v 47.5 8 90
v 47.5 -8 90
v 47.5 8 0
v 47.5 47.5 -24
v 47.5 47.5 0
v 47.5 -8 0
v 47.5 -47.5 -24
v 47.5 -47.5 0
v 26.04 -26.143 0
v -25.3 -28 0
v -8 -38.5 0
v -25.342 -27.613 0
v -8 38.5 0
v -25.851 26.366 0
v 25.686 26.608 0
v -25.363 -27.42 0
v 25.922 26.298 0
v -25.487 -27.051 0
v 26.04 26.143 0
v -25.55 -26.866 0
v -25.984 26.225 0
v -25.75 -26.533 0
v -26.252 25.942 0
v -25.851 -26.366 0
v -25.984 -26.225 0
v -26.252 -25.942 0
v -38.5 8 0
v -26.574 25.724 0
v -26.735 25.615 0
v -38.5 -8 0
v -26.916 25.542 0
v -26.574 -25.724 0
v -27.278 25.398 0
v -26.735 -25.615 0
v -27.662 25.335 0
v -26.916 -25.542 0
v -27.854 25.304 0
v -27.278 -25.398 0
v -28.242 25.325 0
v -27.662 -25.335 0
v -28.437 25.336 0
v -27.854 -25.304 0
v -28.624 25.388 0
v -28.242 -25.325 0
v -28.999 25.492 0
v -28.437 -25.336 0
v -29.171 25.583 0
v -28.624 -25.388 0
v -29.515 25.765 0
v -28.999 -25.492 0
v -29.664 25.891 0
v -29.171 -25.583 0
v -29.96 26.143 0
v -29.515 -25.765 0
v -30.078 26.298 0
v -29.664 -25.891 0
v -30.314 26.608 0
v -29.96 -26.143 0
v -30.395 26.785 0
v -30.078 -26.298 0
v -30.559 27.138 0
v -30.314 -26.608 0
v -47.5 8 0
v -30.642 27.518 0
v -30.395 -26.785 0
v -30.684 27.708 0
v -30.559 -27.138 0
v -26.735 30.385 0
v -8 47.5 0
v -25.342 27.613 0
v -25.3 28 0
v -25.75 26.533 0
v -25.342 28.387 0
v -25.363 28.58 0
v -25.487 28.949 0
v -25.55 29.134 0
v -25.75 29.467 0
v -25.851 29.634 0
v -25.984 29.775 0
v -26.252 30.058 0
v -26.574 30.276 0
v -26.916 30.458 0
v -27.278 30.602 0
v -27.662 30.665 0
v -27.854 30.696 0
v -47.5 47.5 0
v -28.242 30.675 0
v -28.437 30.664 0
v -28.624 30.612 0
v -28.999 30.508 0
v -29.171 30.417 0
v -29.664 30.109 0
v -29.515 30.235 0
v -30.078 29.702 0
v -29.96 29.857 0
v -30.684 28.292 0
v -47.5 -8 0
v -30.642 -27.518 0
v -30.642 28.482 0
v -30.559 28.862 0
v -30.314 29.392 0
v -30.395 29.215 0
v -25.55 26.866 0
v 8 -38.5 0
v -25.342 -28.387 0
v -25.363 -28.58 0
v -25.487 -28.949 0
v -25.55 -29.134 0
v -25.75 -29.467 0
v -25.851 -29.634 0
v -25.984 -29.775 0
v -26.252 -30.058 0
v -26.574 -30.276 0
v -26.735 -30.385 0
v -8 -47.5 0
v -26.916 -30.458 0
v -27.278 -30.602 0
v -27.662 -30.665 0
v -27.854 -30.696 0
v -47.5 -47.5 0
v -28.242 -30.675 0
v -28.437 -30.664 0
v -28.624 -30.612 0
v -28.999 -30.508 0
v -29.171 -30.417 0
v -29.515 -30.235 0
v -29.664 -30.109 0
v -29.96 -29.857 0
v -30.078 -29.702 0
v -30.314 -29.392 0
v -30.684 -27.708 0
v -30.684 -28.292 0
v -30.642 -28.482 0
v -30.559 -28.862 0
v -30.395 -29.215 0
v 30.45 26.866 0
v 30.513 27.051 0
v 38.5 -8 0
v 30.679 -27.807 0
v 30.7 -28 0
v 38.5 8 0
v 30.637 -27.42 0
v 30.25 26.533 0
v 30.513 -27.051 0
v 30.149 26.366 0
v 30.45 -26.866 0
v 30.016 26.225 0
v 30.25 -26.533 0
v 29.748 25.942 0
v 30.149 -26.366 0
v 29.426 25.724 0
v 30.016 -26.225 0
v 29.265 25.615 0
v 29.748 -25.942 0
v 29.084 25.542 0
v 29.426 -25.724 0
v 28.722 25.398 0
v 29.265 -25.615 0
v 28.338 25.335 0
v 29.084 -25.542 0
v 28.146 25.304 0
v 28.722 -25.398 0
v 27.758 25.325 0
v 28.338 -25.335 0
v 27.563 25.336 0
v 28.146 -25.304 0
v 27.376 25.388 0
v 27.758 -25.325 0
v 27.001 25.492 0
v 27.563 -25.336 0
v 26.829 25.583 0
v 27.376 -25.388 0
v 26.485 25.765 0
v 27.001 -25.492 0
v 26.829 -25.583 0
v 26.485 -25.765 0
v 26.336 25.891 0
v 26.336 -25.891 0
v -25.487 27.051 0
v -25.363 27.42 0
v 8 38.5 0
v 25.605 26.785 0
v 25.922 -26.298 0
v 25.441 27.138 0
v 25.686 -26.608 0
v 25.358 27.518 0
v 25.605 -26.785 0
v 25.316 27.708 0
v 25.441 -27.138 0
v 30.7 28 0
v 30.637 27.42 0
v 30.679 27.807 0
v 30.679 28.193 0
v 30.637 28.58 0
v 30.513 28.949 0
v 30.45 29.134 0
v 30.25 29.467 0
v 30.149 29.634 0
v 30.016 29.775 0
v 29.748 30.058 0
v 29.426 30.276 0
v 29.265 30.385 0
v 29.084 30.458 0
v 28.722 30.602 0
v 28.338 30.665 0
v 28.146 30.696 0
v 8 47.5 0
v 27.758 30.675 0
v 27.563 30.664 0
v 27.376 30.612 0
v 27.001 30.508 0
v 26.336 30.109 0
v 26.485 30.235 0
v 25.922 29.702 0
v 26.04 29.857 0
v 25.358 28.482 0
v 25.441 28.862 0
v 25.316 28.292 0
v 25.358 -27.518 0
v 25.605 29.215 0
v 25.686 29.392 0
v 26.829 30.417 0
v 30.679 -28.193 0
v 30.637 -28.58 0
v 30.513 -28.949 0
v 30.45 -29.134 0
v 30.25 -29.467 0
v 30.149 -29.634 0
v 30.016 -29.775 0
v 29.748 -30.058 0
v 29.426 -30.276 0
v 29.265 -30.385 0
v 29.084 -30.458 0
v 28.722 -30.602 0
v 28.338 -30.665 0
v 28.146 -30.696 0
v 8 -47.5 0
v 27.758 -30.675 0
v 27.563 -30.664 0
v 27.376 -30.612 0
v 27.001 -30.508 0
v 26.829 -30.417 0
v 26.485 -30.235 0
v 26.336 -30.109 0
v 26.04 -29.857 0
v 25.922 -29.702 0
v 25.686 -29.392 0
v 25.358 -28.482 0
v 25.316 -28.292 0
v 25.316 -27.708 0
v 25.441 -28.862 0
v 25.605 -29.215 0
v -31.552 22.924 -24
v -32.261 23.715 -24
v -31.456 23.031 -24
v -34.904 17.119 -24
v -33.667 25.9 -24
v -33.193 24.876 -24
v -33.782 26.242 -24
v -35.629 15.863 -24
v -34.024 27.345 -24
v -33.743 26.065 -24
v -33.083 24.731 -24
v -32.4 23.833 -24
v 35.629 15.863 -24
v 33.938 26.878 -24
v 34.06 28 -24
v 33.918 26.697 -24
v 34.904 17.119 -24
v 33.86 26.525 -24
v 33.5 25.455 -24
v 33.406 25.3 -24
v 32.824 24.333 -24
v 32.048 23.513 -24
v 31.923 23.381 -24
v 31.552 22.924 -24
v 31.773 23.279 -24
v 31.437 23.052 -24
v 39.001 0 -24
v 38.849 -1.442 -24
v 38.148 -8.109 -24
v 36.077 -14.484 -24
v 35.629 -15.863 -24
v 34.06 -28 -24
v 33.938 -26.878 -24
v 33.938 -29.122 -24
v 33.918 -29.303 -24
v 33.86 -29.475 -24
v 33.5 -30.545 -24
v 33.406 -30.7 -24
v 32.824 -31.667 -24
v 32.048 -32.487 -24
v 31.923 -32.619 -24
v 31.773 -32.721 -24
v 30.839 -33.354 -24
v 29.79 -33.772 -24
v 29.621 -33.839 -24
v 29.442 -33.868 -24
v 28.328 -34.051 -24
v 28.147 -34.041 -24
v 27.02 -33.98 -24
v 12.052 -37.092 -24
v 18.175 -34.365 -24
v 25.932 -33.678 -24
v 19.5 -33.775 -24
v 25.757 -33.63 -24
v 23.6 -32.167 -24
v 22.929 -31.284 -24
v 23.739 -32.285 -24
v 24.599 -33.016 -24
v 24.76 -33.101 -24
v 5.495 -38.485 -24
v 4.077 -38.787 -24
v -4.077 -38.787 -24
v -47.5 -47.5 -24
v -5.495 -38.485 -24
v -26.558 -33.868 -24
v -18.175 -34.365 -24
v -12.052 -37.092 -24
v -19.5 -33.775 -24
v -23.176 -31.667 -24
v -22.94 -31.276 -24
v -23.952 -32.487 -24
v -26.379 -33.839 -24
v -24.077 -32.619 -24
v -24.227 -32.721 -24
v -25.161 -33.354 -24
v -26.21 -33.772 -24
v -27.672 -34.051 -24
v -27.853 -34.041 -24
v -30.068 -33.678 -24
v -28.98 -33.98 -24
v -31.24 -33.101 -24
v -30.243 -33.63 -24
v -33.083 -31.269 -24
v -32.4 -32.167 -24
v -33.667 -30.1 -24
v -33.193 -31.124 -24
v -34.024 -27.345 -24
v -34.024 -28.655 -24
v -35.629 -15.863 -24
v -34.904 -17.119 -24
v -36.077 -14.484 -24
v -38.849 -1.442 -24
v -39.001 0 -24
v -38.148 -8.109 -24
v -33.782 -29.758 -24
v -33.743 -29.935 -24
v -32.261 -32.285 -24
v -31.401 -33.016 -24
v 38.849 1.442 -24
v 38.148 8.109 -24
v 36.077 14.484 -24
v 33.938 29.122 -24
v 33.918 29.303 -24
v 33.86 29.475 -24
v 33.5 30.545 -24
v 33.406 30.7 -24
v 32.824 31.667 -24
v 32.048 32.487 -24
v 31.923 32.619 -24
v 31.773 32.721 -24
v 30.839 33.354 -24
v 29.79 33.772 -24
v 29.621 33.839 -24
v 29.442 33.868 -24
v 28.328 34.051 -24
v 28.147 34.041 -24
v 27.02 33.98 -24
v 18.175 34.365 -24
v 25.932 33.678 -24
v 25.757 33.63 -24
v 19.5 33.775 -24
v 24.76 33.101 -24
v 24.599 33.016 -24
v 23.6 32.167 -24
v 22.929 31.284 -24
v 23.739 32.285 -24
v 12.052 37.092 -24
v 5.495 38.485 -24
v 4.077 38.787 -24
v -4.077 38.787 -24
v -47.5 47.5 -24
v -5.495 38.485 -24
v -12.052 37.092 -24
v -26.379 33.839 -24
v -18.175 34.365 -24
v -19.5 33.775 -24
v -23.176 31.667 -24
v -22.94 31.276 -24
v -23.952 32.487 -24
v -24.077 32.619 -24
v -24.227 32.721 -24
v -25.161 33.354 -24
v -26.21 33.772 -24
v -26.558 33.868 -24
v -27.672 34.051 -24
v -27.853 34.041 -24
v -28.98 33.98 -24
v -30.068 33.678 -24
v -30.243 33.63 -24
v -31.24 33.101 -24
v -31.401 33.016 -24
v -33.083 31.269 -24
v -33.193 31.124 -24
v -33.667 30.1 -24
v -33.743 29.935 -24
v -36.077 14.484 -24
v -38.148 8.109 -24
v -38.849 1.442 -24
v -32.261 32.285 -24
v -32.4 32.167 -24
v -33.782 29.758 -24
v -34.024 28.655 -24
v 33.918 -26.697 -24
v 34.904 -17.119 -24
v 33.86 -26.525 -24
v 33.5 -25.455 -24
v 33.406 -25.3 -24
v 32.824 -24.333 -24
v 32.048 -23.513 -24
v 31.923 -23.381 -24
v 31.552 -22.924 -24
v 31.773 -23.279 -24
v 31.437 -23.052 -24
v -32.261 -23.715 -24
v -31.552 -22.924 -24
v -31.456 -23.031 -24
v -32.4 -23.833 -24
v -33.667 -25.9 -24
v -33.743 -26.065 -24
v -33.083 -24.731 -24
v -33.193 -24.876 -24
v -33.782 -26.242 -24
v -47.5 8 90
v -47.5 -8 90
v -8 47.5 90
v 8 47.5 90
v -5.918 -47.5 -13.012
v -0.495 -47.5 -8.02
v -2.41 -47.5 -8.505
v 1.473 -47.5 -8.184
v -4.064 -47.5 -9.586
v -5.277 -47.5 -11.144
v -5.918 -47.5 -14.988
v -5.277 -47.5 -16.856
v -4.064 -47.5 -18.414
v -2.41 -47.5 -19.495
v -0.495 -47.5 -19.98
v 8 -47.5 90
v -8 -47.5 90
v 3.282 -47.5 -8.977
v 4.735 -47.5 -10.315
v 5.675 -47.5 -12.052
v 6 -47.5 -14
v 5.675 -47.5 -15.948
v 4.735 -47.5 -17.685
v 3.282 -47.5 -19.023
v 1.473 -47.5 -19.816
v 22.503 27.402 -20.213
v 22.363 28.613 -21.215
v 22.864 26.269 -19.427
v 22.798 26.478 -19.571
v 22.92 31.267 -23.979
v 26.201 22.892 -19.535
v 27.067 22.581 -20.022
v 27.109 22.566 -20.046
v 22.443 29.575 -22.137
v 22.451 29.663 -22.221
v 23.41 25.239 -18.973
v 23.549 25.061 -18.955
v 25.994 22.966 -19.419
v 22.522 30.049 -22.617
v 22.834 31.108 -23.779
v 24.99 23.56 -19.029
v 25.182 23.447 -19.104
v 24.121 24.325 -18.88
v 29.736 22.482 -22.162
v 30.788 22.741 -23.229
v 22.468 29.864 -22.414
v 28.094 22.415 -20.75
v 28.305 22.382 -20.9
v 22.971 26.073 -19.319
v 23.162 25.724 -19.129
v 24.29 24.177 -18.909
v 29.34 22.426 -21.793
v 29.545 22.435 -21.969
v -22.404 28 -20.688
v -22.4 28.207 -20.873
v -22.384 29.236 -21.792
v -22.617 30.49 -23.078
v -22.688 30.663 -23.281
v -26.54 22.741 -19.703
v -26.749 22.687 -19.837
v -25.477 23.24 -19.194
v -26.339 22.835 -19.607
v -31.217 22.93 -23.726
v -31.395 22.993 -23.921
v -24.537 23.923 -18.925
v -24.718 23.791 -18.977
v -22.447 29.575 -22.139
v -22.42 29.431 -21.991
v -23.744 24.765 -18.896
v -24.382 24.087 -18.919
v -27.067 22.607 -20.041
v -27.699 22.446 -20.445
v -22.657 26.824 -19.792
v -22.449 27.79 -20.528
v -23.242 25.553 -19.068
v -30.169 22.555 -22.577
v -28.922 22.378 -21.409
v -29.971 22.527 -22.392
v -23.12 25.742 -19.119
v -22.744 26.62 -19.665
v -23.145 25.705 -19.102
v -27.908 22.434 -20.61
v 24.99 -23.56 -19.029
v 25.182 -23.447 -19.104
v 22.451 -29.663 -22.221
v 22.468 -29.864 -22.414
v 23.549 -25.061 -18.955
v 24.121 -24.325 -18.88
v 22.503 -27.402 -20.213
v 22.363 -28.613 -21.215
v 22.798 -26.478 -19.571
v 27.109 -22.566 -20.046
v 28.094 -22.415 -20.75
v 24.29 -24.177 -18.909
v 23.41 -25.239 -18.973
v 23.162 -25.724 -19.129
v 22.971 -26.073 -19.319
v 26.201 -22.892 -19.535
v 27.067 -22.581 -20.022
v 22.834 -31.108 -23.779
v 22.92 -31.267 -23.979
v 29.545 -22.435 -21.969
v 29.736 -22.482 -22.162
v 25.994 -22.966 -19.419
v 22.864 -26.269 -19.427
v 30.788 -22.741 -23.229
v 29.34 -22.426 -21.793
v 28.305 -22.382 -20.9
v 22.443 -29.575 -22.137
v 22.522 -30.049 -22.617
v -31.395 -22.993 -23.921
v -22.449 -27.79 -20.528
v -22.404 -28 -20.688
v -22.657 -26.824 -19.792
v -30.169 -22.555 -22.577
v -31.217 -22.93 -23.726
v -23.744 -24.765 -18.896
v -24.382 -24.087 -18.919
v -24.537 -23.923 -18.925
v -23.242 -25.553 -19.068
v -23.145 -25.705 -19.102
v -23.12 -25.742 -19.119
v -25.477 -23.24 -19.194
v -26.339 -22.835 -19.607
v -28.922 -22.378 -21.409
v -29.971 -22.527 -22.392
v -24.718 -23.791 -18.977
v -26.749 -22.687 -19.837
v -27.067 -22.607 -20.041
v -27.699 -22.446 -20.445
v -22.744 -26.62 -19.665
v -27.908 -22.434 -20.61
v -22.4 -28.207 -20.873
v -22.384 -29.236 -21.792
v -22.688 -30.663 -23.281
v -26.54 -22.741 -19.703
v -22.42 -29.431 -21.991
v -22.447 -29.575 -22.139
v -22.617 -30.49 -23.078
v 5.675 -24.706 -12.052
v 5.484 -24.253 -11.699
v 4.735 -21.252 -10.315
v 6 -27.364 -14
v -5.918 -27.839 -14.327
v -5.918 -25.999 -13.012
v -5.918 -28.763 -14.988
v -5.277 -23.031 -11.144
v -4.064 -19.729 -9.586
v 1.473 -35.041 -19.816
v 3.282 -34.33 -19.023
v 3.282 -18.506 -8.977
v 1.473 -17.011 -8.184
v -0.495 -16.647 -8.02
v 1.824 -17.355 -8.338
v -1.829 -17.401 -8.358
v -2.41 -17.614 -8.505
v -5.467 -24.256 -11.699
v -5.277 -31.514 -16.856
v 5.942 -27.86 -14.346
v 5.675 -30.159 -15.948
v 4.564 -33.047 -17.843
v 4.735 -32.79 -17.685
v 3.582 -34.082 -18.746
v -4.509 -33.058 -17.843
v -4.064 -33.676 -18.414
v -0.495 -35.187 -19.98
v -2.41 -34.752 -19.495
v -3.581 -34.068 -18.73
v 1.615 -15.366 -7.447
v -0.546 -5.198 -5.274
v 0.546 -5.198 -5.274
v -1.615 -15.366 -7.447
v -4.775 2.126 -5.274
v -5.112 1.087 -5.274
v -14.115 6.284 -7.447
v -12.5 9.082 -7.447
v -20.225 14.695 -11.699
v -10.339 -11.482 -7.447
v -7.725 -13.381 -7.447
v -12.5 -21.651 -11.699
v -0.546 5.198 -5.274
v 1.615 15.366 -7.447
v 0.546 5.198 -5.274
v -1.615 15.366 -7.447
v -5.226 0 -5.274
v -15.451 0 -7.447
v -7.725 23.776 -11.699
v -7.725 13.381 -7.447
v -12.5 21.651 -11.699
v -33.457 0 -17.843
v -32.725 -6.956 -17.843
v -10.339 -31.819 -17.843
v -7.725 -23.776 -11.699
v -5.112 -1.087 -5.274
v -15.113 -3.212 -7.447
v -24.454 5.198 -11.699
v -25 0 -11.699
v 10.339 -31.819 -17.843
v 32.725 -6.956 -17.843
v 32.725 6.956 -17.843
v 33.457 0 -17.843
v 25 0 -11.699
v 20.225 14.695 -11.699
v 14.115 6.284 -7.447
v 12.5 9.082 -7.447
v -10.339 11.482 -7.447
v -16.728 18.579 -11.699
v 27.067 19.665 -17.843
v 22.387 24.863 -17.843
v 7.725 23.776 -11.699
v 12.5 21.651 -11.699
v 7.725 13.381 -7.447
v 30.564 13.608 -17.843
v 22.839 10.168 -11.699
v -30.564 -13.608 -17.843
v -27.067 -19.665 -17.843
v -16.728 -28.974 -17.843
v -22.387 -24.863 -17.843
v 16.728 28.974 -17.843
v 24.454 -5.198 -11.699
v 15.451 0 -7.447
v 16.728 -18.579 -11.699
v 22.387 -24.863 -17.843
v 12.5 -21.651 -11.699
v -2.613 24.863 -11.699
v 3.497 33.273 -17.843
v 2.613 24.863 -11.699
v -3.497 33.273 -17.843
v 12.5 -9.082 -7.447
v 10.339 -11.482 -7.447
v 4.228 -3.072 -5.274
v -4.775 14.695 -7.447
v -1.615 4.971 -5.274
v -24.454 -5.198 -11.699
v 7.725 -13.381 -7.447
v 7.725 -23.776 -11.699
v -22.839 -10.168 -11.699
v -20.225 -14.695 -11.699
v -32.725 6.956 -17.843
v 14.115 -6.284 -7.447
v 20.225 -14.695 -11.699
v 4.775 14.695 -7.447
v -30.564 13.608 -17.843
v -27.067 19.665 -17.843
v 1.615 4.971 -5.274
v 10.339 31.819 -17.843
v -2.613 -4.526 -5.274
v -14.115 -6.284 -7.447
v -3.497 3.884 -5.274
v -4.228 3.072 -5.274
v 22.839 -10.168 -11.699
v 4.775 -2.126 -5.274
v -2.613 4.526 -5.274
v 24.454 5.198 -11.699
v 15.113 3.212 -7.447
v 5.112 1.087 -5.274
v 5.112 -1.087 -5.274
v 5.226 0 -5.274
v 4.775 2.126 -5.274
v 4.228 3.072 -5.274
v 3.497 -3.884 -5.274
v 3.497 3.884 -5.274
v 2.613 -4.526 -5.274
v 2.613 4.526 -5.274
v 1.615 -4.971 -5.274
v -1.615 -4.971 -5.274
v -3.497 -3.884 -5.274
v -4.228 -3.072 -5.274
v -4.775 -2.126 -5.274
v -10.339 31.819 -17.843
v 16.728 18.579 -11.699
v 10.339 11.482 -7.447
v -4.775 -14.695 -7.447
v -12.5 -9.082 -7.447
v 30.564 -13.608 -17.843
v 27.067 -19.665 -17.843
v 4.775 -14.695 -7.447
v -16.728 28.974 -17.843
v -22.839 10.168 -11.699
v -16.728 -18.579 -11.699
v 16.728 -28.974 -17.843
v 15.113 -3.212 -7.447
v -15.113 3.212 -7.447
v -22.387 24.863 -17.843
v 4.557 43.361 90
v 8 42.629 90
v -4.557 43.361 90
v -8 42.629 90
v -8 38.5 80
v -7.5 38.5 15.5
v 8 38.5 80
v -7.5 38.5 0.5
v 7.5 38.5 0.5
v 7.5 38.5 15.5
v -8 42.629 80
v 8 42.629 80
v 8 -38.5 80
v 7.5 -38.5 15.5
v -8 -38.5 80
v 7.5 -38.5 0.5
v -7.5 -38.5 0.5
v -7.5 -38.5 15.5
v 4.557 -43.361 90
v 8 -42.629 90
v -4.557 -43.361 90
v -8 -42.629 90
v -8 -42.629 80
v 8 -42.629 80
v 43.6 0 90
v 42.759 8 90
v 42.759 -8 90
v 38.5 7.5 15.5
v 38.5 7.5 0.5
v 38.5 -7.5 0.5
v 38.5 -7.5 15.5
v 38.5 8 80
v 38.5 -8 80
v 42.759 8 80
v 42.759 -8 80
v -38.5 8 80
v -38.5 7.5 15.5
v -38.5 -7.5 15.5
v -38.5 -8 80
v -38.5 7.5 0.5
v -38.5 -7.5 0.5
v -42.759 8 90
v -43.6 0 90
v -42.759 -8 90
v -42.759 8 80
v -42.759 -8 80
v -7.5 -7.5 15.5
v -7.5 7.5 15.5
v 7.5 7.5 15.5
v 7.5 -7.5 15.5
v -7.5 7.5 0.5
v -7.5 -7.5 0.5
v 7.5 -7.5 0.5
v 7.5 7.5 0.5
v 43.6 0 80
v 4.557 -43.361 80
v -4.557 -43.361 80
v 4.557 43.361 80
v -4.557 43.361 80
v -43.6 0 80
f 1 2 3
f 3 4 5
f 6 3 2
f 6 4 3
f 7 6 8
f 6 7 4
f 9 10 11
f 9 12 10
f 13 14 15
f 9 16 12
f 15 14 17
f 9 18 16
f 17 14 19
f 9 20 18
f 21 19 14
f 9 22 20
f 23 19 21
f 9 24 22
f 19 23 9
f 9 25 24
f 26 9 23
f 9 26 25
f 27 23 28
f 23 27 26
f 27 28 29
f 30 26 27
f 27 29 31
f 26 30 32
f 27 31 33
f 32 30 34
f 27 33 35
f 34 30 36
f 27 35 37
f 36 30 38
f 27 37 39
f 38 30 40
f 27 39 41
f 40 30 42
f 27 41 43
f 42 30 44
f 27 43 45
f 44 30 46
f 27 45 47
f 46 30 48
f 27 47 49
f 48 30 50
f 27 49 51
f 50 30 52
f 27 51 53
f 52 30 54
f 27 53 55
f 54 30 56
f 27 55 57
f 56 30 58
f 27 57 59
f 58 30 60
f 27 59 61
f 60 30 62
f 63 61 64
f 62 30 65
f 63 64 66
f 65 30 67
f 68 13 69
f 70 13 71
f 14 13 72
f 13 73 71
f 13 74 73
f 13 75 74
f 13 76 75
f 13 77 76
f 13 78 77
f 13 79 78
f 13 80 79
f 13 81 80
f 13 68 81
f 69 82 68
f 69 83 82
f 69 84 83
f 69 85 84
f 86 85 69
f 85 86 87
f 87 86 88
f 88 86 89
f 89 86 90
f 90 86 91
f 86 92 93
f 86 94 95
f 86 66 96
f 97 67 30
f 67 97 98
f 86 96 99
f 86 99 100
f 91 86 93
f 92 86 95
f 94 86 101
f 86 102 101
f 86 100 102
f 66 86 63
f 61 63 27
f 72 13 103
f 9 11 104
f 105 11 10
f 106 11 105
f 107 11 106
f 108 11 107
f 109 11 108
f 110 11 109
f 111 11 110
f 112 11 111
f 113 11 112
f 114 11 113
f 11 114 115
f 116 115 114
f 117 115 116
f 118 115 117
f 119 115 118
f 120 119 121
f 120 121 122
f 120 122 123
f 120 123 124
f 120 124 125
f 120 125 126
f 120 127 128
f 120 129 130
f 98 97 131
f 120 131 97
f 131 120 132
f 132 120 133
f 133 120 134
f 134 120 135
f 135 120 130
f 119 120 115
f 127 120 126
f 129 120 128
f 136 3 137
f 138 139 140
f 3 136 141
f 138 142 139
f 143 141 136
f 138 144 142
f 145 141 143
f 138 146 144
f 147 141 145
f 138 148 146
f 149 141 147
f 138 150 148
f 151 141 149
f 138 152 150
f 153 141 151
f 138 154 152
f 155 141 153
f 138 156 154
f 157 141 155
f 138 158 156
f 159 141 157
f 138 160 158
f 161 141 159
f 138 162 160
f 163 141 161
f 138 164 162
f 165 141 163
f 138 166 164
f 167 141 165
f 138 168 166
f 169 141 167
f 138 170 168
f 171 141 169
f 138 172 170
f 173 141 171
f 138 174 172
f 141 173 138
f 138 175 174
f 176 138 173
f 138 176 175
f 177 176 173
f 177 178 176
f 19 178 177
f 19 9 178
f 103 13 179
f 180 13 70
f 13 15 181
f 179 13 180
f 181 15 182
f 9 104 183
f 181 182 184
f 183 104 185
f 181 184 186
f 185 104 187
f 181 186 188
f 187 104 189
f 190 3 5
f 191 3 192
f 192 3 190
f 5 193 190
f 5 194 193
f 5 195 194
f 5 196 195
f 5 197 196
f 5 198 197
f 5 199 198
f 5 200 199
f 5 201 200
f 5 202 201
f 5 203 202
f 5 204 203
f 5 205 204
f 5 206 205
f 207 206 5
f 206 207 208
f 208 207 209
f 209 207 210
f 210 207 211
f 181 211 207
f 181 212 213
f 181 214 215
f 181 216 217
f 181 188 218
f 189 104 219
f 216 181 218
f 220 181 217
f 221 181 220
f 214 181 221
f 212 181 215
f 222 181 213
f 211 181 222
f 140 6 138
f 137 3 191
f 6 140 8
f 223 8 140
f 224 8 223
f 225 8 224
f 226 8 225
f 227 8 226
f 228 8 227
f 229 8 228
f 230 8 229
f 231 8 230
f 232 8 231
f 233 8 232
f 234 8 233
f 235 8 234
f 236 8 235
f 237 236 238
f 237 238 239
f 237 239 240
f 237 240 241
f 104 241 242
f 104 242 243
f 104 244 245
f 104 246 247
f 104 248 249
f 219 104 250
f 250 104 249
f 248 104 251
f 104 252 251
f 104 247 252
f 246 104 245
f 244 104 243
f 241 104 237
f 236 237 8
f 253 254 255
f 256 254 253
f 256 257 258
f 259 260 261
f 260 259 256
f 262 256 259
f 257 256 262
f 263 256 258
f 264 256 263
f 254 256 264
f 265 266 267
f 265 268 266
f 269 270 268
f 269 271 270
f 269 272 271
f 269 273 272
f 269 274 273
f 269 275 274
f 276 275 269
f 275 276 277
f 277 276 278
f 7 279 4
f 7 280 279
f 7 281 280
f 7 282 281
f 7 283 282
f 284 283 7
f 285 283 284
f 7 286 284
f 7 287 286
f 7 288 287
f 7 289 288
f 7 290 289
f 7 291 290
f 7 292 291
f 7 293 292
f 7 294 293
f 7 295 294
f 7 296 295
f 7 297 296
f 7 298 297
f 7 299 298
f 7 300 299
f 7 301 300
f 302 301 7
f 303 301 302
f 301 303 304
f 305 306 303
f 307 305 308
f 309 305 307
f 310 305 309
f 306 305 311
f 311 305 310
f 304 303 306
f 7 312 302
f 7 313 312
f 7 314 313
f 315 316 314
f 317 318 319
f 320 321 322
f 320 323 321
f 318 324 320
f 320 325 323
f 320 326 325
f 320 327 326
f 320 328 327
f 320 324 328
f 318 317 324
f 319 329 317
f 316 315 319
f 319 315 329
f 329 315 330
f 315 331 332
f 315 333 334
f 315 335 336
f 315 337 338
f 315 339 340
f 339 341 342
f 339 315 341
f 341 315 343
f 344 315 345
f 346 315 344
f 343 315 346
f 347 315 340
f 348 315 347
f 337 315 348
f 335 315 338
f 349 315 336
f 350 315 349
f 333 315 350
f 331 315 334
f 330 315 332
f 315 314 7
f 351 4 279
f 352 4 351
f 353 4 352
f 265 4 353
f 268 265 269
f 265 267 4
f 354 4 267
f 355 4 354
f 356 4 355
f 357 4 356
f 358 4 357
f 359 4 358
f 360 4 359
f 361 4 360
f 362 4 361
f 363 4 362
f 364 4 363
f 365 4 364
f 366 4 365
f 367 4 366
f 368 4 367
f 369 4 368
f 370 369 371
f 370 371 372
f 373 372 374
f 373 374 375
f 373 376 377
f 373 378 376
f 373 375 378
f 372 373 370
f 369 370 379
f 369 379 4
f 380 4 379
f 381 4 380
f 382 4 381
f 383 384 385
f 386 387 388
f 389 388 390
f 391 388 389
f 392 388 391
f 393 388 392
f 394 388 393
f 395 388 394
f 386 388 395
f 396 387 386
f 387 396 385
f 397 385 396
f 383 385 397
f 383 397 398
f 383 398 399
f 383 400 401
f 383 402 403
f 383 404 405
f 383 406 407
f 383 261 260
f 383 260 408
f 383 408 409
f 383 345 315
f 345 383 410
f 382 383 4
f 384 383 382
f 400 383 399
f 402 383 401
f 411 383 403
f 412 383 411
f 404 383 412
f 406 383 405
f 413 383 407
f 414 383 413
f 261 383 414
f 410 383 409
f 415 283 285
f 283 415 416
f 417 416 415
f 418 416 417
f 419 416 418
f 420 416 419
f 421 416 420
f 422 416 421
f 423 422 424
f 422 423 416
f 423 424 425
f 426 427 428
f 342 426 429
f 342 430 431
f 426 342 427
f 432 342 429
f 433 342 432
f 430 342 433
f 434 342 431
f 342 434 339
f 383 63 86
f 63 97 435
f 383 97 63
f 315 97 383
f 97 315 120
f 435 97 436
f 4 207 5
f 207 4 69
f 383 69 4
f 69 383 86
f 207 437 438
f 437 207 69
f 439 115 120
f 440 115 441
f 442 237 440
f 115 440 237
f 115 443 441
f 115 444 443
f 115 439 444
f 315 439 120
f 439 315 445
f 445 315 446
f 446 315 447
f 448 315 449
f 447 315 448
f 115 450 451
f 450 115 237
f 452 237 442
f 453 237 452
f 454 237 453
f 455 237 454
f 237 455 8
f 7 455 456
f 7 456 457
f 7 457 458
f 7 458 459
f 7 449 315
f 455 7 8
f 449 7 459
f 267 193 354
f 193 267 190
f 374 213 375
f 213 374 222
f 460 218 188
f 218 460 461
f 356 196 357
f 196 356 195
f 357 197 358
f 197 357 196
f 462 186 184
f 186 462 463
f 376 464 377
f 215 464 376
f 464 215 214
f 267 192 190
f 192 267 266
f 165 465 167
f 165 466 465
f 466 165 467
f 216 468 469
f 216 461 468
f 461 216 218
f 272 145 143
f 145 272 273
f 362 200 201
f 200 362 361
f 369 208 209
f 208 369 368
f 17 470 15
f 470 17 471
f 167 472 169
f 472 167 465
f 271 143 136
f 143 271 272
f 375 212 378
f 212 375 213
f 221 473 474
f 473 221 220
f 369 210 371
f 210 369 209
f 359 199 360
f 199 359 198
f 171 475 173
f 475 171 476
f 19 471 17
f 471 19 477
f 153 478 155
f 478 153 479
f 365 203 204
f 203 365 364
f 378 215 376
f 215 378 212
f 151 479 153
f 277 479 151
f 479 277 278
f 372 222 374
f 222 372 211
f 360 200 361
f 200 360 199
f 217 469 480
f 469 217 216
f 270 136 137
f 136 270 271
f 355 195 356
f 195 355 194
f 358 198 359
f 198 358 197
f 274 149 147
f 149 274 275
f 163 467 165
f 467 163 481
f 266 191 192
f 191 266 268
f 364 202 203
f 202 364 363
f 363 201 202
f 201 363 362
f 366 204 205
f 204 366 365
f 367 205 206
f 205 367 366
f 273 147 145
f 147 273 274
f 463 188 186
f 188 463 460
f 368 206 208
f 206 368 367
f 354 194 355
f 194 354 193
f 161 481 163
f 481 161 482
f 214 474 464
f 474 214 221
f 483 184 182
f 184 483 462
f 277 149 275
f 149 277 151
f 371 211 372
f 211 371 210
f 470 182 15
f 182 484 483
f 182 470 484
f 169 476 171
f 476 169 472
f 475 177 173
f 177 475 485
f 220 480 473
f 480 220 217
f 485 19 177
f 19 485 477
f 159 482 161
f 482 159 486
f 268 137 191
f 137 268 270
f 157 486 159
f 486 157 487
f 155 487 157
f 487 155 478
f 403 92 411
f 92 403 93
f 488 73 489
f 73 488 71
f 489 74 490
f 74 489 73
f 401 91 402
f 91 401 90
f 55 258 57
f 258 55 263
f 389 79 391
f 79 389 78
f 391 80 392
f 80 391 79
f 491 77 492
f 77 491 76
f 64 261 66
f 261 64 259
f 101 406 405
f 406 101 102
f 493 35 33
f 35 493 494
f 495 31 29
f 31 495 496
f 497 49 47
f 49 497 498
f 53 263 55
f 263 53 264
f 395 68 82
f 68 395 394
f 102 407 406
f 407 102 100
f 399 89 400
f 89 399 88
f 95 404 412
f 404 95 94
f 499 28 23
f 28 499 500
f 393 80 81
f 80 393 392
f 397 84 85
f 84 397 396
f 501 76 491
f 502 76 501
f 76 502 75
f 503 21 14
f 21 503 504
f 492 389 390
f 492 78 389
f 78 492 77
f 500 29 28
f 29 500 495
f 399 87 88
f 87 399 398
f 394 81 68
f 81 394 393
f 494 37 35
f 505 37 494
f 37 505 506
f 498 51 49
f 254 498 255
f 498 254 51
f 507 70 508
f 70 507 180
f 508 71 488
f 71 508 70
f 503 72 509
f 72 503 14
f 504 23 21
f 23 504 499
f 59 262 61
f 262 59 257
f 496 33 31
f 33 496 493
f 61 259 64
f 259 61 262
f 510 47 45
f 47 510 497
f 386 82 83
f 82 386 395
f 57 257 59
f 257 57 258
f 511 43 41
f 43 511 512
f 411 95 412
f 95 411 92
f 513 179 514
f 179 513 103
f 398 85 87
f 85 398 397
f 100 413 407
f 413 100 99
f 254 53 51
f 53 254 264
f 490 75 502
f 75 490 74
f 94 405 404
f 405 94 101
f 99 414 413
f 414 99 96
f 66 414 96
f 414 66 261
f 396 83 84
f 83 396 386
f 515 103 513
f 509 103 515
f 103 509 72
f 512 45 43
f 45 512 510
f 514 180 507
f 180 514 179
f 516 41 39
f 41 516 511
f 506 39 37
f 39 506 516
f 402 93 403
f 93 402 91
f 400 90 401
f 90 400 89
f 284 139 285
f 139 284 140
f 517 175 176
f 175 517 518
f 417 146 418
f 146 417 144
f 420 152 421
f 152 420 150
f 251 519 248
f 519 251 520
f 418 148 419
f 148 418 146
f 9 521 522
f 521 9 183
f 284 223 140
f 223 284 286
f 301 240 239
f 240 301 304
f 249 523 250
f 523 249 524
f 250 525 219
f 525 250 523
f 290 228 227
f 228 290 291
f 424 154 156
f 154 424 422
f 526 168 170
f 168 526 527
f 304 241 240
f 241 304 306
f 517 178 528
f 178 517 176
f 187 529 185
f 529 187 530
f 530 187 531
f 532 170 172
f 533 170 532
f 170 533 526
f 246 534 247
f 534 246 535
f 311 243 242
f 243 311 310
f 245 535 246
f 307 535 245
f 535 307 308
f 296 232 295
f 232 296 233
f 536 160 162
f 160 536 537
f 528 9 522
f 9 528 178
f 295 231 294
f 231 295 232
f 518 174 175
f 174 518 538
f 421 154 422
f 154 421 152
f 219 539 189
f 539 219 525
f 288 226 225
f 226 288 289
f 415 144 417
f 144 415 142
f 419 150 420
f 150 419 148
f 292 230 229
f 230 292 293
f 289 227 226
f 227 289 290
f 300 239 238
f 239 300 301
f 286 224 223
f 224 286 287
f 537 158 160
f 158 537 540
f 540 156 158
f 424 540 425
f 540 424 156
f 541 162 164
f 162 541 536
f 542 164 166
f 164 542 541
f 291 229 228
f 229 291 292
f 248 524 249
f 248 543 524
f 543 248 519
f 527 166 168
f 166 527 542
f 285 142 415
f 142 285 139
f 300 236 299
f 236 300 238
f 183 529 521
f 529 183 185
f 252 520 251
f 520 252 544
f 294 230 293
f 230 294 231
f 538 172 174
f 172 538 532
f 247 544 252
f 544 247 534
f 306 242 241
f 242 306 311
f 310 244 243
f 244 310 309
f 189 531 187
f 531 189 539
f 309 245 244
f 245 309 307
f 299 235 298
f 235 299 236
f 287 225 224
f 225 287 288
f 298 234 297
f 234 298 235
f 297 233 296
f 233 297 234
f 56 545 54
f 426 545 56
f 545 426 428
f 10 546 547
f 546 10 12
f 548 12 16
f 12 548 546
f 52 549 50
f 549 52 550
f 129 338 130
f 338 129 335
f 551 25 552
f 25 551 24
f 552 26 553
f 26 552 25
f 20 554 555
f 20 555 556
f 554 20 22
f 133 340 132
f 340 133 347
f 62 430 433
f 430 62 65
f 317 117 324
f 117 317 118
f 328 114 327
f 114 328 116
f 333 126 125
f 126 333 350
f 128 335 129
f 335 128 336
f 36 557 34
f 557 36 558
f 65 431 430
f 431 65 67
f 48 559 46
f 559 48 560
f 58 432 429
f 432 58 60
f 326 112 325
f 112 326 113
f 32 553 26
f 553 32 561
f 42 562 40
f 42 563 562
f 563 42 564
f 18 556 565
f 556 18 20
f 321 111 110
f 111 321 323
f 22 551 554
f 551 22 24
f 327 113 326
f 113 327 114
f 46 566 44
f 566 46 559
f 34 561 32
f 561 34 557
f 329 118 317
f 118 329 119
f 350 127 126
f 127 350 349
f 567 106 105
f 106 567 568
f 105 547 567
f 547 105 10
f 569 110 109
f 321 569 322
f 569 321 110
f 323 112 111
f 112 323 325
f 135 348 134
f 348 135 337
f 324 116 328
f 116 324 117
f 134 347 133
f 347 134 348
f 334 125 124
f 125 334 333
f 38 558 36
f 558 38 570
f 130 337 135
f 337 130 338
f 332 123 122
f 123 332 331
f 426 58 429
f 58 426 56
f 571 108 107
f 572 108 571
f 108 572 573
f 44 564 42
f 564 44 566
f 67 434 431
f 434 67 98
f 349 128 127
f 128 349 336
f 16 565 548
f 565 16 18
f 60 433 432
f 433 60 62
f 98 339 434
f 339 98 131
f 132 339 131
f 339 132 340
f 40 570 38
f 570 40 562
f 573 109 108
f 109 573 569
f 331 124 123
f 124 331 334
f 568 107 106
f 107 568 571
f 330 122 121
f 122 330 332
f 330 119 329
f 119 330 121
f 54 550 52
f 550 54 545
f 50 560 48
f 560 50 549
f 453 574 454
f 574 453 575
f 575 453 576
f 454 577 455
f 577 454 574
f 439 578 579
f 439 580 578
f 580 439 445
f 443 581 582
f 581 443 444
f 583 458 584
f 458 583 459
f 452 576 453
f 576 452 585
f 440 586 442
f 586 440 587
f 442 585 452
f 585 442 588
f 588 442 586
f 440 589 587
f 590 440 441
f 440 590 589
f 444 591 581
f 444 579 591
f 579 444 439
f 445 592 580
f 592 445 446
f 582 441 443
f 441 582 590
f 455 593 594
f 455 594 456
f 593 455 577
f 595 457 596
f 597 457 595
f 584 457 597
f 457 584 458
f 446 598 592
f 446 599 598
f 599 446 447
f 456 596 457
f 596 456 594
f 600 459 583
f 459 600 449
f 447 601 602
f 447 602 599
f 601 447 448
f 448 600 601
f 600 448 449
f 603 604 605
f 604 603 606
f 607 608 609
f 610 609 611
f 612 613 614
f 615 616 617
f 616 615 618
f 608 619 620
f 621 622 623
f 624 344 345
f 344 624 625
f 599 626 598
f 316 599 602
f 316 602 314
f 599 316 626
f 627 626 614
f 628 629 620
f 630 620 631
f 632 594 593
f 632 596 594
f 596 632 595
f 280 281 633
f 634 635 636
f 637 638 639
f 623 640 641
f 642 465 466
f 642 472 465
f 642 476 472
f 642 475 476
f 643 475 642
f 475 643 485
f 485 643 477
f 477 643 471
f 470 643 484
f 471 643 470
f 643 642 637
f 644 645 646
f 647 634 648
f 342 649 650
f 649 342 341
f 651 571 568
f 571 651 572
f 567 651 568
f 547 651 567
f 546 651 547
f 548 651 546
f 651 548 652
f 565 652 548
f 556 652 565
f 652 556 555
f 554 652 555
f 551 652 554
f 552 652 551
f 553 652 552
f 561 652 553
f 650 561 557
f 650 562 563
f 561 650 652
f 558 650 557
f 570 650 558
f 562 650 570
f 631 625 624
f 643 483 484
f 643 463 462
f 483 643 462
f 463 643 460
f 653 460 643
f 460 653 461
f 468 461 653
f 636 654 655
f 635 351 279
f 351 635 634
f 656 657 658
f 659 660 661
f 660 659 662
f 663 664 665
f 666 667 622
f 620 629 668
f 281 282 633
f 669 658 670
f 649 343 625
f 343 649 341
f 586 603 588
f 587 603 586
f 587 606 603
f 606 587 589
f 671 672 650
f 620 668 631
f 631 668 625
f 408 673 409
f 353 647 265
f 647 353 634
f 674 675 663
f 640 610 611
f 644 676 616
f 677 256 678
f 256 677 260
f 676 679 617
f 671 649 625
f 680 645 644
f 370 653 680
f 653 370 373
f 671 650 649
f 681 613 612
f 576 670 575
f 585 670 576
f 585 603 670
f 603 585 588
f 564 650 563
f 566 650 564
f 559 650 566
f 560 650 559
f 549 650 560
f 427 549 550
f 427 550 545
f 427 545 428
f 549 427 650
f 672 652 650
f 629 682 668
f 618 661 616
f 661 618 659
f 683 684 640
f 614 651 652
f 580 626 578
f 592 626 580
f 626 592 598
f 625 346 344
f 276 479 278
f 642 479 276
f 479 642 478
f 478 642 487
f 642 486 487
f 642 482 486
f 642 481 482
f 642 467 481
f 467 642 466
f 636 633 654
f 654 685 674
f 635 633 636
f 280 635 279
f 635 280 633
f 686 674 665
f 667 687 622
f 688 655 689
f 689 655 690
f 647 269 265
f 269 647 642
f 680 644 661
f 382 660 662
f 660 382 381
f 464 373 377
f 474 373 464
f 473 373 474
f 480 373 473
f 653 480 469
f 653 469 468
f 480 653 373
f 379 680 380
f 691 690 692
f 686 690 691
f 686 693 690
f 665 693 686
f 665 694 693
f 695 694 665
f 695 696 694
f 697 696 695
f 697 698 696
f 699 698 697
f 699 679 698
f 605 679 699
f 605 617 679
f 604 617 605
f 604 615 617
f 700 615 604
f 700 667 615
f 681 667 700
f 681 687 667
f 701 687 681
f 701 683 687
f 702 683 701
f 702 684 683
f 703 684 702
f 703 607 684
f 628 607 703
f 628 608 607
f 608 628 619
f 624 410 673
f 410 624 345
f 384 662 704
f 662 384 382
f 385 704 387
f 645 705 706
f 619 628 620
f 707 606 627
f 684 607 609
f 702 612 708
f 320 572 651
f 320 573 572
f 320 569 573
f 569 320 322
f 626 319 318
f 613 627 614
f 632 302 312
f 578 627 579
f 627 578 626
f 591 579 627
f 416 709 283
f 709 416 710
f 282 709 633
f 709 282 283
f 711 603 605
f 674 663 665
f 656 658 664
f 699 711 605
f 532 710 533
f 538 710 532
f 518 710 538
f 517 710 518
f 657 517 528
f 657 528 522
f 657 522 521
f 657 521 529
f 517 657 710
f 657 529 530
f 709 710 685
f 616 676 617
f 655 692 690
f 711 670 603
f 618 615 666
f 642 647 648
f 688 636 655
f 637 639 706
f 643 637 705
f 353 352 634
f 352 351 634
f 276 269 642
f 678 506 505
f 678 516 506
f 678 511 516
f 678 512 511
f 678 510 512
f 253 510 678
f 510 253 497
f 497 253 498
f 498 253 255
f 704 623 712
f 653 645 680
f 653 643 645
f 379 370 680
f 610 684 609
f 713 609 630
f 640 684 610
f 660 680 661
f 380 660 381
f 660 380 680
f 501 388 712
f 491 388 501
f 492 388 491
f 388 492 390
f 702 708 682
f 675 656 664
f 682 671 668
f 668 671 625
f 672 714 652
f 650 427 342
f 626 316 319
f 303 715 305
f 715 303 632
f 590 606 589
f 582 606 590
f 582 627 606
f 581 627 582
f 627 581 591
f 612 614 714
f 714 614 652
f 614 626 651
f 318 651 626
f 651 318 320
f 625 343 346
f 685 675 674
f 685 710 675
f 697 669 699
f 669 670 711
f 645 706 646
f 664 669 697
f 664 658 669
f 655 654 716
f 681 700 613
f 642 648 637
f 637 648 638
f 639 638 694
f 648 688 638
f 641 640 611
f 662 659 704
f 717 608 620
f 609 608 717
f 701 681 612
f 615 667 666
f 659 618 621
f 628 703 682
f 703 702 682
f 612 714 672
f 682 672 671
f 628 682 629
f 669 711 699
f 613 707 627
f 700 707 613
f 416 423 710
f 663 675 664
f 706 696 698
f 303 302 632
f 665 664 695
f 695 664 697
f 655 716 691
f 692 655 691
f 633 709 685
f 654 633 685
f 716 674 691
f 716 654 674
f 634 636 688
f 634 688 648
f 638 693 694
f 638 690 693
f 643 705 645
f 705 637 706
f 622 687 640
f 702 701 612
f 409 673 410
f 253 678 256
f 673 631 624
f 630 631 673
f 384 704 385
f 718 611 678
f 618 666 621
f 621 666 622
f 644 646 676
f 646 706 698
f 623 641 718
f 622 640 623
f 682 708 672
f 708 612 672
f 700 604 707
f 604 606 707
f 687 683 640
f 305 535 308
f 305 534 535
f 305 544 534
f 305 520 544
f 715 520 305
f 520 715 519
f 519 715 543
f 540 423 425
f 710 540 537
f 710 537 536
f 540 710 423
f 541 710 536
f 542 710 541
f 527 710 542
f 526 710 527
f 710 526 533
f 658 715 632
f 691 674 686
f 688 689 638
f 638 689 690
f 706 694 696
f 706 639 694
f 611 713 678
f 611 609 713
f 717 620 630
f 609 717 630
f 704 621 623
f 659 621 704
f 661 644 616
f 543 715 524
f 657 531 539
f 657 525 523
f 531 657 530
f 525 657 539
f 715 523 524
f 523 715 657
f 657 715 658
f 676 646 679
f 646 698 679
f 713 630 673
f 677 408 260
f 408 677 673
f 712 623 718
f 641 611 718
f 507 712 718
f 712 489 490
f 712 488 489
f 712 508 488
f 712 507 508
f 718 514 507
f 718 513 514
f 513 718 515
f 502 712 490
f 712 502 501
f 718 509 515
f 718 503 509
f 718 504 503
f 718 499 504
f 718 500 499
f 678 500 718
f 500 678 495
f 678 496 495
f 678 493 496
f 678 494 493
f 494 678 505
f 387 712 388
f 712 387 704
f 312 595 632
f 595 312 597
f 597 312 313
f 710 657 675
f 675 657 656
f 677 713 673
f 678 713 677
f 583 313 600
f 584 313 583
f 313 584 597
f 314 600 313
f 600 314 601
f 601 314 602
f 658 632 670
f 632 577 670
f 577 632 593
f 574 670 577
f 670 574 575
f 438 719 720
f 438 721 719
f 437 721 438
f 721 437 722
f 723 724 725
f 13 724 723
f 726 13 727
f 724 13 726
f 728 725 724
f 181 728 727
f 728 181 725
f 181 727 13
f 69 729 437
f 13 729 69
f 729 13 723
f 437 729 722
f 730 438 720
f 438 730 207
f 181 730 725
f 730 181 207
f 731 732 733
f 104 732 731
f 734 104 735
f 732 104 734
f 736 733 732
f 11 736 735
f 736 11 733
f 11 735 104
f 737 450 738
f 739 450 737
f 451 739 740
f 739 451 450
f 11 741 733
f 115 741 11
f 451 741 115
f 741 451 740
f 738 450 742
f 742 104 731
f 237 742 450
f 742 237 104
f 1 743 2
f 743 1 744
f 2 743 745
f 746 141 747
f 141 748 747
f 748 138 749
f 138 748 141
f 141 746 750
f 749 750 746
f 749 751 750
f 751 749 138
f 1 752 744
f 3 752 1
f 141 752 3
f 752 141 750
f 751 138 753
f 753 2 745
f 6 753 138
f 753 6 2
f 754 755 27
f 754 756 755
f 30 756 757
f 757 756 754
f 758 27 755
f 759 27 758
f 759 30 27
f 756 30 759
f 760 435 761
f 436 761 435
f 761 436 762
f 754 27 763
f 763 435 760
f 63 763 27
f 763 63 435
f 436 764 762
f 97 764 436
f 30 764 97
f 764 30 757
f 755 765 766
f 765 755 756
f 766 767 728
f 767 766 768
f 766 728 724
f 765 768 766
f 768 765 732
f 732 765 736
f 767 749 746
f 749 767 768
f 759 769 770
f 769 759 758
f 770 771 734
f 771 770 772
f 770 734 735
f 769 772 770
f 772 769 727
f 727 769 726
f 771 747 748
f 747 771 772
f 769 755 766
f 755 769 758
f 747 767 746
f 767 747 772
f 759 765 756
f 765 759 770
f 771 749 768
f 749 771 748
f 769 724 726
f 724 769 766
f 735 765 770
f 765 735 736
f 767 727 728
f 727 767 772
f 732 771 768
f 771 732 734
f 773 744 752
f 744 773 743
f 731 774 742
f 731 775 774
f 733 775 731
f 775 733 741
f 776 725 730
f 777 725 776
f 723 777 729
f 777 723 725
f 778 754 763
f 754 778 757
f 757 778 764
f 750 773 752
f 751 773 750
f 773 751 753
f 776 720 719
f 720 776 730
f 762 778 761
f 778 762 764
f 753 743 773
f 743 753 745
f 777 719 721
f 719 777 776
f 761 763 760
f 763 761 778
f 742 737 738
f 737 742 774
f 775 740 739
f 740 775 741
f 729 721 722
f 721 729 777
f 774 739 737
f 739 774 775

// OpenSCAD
difference() {
    translate([0,0,-12]) cube([95,95,24],true);
    //translate([0,0,-14]) sphere(32,true);
        translate([28,28,-20])cylinder(50,9,2,true);
    translate([-28,28,-20])cylinder(50,9,2,true);
    translate([28,-28,-20])cylinder(50,9,2,true);
    translate([-28,-28,-20])cylinder(50,9,2,true);
    translate([0,-32,-14]) rotate([90,0,0])cylinder(50,6,6,true);
    translate([0,0,-55]) sphere(50,true);
   // translate([0,0,-55]) rotate([90,-90,0])  cylinder(70,50,50,true);

}
difference() {
    union() {
        translate([43,0,45]) cube([9,16,90], true);
        translate([-43,0,45]) cube([9,16,90], true);


        rotate([0,0,90]) union() {
            translate([43,0,45]) cube([9,16,90], true);
            translate([-43,0,45]) cube([9,16,90], true);

        }
        translate([0,0,8]) cube([85,15,15],true);
         translate([0,0,8]) rotate([0,0,90]) cube([84,15,15],true);
    }
    translate([0,0,80]) cylinder(12,43.6,43.6);
}
